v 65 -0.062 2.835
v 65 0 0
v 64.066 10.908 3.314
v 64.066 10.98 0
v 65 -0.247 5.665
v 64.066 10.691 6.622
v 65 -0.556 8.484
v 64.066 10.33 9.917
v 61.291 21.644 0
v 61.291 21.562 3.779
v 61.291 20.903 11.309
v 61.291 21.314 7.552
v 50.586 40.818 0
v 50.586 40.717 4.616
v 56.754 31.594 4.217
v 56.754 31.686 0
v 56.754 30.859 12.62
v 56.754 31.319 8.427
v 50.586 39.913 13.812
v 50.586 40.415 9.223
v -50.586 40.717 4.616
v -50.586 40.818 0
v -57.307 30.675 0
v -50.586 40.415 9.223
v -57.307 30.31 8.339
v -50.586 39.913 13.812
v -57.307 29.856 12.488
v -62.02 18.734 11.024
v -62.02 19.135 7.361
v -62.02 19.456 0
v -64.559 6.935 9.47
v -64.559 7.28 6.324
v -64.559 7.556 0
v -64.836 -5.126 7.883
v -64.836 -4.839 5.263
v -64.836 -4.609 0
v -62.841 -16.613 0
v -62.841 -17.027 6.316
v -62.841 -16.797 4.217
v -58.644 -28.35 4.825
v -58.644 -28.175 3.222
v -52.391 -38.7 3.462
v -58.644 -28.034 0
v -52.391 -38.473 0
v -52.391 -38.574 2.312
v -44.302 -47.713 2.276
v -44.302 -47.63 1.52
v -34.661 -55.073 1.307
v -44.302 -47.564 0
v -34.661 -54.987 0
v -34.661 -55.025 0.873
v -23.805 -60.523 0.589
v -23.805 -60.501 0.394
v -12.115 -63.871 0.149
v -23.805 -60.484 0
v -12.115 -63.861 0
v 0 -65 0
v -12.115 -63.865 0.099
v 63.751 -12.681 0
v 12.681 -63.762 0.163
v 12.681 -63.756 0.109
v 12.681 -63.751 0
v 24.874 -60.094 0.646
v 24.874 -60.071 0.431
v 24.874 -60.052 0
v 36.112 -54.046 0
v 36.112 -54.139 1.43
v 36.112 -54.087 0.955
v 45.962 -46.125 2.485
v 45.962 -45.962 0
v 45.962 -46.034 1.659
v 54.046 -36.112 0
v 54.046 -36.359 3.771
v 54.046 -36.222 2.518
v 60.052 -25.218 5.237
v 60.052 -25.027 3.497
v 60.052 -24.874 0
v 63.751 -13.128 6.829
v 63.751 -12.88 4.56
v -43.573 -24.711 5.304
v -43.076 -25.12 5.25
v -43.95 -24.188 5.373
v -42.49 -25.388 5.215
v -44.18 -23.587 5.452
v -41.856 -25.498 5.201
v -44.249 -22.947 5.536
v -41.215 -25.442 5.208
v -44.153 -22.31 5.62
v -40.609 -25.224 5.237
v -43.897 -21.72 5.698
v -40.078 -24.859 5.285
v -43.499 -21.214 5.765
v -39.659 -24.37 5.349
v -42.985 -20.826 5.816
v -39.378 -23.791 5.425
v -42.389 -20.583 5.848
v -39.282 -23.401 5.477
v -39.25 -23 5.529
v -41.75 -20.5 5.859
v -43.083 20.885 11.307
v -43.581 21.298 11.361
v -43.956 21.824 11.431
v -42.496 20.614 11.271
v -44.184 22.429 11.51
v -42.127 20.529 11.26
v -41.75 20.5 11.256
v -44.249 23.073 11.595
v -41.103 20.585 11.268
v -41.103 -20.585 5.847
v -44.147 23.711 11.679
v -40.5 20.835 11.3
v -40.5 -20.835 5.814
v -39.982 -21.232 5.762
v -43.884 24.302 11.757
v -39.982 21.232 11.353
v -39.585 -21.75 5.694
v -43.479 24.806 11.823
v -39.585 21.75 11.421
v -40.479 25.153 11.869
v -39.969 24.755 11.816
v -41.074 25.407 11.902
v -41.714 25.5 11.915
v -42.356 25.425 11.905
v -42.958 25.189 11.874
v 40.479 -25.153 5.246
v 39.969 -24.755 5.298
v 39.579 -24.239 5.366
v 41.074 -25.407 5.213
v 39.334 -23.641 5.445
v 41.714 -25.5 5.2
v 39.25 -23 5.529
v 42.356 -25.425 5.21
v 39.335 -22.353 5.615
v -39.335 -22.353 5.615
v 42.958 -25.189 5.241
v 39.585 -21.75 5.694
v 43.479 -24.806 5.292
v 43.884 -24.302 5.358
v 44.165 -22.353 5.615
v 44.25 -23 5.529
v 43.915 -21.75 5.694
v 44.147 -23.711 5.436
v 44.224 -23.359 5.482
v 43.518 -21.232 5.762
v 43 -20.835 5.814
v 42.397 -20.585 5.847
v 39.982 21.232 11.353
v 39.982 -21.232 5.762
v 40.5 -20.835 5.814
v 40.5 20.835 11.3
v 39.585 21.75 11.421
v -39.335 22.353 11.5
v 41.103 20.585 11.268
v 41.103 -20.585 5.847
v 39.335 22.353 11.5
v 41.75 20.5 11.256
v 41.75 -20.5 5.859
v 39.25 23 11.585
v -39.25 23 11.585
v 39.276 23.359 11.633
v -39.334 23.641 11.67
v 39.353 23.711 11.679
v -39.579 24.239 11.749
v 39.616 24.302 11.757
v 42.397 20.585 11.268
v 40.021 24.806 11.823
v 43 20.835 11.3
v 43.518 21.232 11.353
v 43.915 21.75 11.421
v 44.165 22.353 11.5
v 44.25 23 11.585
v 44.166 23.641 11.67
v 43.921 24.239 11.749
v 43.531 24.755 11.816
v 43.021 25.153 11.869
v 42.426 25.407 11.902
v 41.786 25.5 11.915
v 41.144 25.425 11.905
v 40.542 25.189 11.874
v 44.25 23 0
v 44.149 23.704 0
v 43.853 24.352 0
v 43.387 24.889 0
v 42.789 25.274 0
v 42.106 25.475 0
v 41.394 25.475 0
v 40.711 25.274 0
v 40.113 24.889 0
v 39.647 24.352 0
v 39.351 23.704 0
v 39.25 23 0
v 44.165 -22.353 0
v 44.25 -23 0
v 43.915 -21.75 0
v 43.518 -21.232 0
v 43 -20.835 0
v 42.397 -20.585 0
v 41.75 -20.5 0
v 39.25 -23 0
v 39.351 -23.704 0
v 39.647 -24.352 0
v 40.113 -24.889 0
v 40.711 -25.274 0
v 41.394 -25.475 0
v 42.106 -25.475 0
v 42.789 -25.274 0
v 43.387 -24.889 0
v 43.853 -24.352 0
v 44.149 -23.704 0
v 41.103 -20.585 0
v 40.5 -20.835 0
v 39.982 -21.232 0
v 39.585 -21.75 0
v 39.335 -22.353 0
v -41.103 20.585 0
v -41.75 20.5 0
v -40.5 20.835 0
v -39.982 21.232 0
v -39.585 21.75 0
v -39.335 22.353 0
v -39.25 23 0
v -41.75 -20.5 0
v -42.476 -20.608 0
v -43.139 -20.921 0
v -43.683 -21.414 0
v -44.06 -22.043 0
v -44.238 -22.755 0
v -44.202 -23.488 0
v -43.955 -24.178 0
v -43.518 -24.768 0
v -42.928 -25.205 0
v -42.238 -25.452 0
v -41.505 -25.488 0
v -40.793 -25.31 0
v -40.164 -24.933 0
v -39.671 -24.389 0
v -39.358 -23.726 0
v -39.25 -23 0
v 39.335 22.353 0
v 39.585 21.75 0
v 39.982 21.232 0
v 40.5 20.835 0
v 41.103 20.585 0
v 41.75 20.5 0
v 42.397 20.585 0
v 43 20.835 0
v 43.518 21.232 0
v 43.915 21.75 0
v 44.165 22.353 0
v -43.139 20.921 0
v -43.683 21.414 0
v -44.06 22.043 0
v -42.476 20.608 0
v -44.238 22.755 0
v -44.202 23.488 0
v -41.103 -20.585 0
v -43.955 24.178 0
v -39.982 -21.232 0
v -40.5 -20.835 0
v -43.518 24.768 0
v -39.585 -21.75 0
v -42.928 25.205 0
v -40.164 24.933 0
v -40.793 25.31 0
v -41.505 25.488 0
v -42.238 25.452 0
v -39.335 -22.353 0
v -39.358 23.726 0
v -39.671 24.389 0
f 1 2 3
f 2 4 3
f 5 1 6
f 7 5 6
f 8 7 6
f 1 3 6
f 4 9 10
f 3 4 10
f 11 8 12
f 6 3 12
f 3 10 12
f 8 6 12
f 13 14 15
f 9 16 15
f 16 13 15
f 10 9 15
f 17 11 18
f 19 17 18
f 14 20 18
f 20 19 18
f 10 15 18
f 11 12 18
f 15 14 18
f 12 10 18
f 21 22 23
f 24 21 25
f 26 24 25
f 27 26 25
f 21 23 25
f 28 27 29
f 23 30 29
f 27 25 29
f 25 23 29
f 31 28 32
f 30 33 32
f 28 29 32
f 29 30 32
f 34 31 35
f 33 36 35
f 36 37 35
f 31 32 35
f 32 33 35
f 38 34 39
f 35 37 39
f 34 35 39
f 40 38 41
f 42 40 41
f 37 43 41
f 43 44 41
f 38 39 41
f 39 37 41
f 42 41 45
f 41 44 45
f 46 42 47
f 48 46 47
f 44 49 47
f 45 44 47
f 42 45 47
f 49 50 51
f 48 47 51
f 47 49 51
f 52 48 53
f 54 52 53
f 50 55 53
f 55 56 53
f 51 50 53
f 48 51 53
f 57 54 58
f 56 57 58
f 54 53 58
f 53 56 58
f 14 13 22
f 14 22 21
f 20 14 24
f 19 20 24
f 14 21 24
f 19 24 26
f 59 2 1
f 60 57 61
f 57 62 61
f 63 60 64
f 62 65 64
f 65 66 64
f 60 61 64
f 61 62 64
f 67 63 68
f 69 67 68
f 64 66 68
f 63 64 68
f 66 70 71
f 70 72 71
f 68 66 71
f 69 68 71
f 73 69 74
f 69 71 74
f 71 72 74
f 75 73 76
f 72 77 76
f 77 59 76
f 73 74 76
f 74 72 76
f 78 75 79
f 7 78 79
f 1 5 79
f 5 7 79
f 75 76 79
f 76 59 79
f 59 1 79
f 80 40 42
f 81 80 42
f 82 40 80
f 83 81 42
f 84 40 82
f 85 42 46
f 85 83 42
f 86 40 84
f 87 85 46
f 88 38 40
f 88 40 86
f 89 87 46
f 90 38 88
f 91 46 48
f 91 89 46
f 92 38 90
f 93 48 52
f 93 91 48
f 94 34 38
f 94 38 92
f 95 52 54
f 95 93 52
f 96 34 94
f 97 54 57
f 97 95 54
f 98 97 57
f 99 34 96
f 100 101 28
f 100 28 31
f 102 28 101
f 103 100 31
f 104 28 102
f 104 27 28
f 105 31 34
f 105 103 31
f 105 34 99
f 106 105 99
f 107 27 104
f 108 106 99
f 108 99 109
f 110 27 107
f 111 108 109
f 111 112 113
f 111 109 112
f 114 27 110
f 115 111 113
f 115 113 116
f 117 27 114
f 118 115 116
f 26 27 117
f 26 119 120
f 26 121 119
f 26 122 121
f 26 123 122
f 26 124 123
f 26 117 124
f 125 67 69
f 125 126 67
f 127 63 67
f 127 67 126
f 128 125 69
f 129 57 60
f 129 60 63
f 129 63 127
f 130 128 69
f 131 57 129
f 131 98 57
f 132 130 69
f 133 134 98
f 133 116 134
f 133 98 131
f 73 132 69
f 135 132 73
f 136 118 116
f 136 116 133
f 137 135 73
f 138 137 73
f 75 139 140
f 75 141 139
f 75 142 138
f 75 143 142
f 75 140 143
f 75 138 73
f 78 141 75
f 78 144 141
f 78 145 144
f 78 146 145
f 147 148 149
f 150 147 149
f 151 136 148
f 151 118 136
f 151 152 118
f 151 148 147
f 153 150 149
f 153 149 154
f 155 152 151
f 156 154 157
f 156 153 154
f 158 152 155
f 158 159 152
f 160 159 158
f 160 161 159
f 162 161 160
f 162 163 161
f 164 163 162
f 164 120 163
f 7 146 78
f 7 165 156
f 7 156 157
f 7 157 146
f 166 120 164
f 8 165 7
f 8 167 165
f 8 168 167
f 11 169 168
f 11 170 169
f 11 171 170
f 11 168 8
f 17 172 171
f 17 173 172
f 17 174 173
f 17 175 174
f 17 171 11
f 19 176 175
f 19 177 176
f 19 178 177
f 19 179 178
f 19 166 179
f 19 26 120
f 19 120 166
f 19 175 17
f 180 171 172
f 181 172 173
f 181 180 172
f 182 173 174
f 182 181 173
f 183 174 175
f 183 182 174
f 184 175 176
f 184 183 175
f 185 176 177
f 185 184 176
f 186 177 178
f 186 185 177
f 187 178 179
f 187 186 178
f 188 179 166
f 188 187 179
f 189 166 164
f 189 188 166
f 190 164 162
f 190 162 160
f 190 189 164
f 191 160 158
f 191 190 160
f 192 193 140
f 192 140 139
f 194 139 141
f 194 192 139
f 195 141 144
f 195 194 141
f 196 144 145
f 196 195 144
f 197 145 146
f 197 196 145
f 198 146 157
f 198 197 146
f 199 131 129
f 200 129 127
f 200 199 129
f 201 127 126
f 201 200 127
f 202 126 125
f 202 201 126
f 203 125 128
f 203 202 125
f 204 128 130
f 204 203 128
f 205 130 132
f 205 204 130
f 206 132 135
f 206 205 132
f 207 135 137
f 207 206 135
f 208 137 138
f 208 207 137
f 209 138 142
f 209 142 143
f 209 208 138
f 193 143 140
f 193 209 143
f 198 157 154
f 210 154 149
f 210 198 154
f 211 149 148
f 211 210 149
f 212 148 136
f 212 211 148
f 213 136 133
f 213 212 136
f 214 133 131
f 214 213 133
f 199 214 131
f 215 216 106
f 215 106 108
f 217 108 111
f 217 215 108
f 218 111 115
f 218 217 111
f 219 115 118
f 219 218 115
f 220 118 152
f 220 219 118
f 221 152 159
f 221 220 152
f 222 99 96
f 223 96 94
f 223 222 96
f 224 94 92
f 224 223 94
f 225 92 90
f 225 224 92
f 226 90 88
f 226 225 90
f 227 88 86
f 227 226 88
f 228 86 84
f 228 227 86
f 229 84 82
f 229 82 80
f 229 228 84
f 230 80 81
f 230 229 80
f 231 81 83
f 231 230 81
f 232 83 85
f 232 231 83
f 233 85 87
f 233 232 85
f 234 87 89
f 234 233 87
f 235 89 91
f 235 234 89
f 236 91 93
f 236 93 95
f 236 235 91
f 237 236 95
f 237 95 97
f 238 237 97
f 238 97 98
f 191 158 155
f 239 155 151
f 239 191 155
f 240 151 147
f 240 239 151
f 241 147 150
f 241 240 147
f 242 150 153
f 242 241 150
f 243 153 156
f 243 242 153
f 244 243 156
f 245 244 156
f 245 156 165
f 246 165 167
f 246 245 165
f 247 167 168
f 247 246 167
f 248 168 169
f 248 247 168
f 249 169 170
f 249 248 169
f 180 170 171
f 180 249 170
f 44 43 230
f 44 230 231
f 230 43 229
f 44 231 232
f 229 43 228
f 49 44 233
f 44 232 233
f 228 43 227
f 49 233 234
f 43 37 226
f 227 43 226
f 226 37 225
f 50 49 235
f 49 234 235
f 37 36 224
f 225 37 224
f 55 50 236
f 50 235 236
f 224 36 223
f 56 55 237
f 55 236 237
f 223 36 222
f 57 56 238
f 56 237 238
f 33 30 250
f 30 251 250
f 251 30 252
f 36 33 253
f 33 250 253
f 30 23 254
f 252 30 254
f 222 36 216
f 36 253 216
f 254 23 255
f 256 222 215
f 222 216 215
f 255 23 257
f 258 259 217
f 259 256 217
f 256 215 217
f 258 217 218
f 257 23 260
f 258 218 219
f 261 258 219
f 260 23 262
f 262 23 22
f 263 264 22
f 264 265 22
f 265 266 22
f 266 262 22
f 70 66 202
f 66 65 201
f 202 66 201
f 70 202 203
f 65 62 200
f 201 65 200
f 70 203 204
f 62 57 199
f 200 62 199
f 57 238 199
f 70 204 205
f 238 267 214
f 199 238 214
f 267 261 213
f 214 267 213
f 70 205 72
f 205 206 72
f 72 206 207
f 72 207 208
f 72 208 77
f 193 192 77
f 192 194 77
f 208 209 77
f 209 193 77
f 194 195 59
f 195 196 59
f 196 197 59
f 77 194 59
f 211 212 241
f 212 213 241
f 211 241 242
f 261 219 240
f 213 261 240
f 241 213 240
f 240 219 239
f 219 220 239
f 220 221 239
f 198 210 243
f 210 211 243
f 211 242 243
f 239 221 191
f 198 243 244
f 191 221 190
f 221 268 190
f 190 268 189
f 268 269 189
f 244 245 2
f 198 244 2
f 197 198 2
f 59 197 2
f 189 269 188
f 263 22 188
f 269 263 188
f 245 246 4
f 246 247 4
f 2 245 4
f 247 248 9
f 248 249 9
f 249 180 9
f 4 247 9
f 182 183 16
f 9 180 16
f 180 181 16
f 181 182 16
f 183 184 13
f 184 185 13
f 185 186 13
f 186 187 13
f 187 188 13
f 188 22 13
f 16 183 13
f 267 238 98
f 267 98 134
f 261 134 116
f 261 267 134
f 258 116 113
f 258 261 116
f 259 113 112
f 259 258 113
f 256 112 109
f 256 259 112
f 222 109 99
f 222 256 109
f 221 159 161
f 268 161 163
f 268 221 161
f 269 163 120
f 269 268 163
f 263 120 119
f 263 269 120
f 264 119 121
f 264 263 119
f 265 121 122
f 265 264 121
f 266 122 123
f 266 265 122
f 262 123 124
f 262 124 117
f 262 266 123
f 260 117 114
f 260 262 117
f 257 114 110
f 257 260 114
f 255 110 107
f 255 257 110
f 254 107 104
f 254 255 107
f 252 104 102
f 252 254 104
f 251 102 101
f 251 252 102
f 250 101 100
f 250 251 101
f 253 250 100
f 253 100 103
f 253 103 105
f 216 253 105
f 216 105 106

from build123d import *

# Parameters (mm, degrees)
F1_ANGLE = 7.5
F2_DEPTH = 13.8130175157


# Not quite as in the source:
# - a feature names something its author has since deleted; it is built from what else it names


with BuildPart() as f1:
    # F0 (on Top) → F1 (revolve)
    with BuildSketch(Plane.XY):
        with BuildLine():
            ThreePointArc((0, -65), (45.9619407771, -45.9619407771), (65, 0))
            ThreePointArc((65, 0), (61.2905274084, 21.6441966818), (50.5855, 40.8179763064))
            Line((50.5855, 40.8179763064), (-50.5855, 40.8179763064))
            ThreePointArc((-50.5855, 40.8179763064), (-58.6437058, -28.034189306), (0, -65))
        make_face()
        with BuildLine():
            Line((39.25, -23), (-39.25, -23))
            ThreePointArc((-39.25, -23), (-43.517766953, -24.767766953), (-41.75, -20.5))
            Line((-41.75, -20.5), (-41.75, 20.5))
            ThreePointArc((-41.75, 20.5), (-43.517766953, 24.767766953), (-39.25, 23))
            Line((-39.25, 23), (39.25, 23))
            ThreePointArc((39.25, 23), (41.75, 25.5), (44.25, 23))
            ThreePointArc((44.25, 23), (43.517766953, 21.232233047), (41.75, 20.5))
            Line((41.75, 20.5), (41.75, -20.5))
            ThreePointArc((41.75, -20.5), (43.517766953, -21.232233047), (44.25, -23))
            ThreePointArc((44.25, -23), (41.75, -25.5), (39.25, -23))
        make_face(mode=Mode.SUBTRACT)
        with BuildLine():
            ThreePointArc((-41.75, -20.5), (-43.517766953, -24.767766953), (-39.25, -23))
            Line((-39.25, -23), (-41.75, -23))
            Line((-41.75, -23), (-41.75, -20.5))
        make_face()
        with BuildLine():
            ThreePointArc((-41.75, -20.5), (-39.982233047, -21.232233047), (-39.25, -23))
            Line((-39.25, -23), (39.25, -23))
            ThreePointArc((39.25, -23), (39.982233047, -21.232233047), (41.75, -20.5))
            Line((41.75, -20.5), (41.75, 20.5))
            ThreePointArc((41.75, 20.5), (39.982233047, 21.232233047), (39.25, 23))
            Line((39.25, 23), (-39.25, 23))
            ThreePointArc((-39.25, 23), (-39.982233047, 21.232233047), (-41.75, 20.5))
            Line((-41.75, 20.5), (-41.75, -20.5))
        make_face()
        with BuildLine():
            Line((-41.75, -23), (-39.25, -23))
            ThreePointArc((-39.25, -23), (-39.982233047, -21.232233047), (-41.75, -20.5))
            Line((-41.75, -20.5), (-41.75, -23))
        make_face()
        with BuildLine():
            ThreePointArc((41.75, -20.5), (39.982233047, -21.232233047), (39.25, -23))
            Line((39.25, -23), (41.75, -23))
            Line((41.75, -23), (41.75, -20.5))
        make_face()
        with BuildLine():
            Line((41.75, -23), (39.25, -23))
            ThreePointArc((39.25, -23), (41.75, -25.5), (44.25, -23))
            ThreePointArc((44.25, -23), (43.517766953, -21.232233047), (41.75, -20.5))
            Line((41.75, -20.5), (41.75, -23))
        make_face()
        with BuildLine():
            ThreePointArc((-39.25, 23), (-43.517766953, 24.767766953), (-41.75, 20.5))
            Line((-41.75, 20.5), (-41.75, 23))
            Line((-41.75, 23), (-39.25, 23))
        make_face()
        with BuildLine():
            Line((-41.75, 23), (-41.75, 20.5))
            ThreePointArc((-41.75, 20.5), (-39.982233047, 21.232233047), (-39.25, 23))
            Line((-39.25, 23), (-41.75, 23))
        make_face()
        with BuildLine():
            ThreePointArc((39.25, 23), (39.982233047, 21.232233047), (41.75, 20.5))
            Line((41.75, 20.5), (41.75, 23))
            Line((41.75, 23), (39.25, 23))
        make_face()
        with BuildLine():
            Line((41.75, 23), (41.75, 20.5))
            ThreePointArc((41.75, 20.5), (43.517766953, 21.232233047), (44.25, 23))
            ThreePointArc((44.25, 23), (41.75, 25.5), (39.25, 23))
            Line((39.25, 23), (41.75, 23))
        make_face()
    revolve(axis=Axis((33.3227813244, -65, 0), (1, 0, 0)), revolution_arc=F1_ANGLE)

    # F0 (on Top) → F2 (cut, through all)
    with BuildSketch(Plane.XY):
        with BuildLine():
            Line((-41.75, -23), (-39.25, -23))
            ThreePointArc((-39.25, -23), (-39.982233047, -21.232233047), (-41.75, -20.5))
            Line((-41.75, -20.5), (-41.75, -23))
        make_face()
        with BuildLine():
            ThreePointArc((-41.75, -20.5), (-43.517766953, -24.767766953), (-39.25, -23))
            Line((-39.25, -23), (-41.75, -23))
            Line((-41.75, -23), (-41.75, -20.5))
        make_face()
        with BuildLine():
            ThreePointArc((41.75, -20.5), (39.982233047, -21.232233047), (39.25, -23))
            Line((39.25, -23), (41.75, -23))
            Line((41.75, -23), (41.75, -20.5))
        make_face()
        with BuildLine():
            Line((41.75, -23), (39.25, -23))
            ThreePointArc((39.25, -23), (41.75, -25.5), (44.25, -23))
            ThreePointArc((44.25, -23), (43.517766953, -21.232233047), (41.75, -20.5))
            Line((41.75, -20.5), (41.75, -23))
        make_face()
        with BuildLine():
            ThreePointArc((39.25, 23), (39.982233047, 21.232233047), (41.75, 20.5))
            Line((41.75, 20.5), (41.75, 23))
            Line((41.75, 23), (39.25, 23))
        make_face()
        with BuildLine():
            Line((41.75, 23), (41.75, 20.5))
            ThreePointArc((41.75, 20.5), (43.517766953, 21.232233047), (44.25, 23))
            ThreePointArc((44.25, 23), (41.75, 25.5), (39.25, 23))
            Line((39.25, 23), (41.75, 23))
        make_face()
        with BuildLine():
            Line((-41.75, 23), (-41.75, 20.5))
            ThreePointArc((-41.75, 20.5), (-39.982233047, 21.232233047), (-39.25, 23))
            Line((-39.25, 23), (-41.75, 23))
        make_face()
        with BuildLine():
            ThreePointArc((-39.25, 23), (-43.517766953, 24.767766953), (-41.75, 20.5))
            Line((-41.75, 20.5), (-41.75, 23))
            Line((-41.75, 23), (-39.25, 23))
        make_face()
    extrude(amount=F2_DEPTH, mode=Mode.SUBTRACT)


solid = f1.part
